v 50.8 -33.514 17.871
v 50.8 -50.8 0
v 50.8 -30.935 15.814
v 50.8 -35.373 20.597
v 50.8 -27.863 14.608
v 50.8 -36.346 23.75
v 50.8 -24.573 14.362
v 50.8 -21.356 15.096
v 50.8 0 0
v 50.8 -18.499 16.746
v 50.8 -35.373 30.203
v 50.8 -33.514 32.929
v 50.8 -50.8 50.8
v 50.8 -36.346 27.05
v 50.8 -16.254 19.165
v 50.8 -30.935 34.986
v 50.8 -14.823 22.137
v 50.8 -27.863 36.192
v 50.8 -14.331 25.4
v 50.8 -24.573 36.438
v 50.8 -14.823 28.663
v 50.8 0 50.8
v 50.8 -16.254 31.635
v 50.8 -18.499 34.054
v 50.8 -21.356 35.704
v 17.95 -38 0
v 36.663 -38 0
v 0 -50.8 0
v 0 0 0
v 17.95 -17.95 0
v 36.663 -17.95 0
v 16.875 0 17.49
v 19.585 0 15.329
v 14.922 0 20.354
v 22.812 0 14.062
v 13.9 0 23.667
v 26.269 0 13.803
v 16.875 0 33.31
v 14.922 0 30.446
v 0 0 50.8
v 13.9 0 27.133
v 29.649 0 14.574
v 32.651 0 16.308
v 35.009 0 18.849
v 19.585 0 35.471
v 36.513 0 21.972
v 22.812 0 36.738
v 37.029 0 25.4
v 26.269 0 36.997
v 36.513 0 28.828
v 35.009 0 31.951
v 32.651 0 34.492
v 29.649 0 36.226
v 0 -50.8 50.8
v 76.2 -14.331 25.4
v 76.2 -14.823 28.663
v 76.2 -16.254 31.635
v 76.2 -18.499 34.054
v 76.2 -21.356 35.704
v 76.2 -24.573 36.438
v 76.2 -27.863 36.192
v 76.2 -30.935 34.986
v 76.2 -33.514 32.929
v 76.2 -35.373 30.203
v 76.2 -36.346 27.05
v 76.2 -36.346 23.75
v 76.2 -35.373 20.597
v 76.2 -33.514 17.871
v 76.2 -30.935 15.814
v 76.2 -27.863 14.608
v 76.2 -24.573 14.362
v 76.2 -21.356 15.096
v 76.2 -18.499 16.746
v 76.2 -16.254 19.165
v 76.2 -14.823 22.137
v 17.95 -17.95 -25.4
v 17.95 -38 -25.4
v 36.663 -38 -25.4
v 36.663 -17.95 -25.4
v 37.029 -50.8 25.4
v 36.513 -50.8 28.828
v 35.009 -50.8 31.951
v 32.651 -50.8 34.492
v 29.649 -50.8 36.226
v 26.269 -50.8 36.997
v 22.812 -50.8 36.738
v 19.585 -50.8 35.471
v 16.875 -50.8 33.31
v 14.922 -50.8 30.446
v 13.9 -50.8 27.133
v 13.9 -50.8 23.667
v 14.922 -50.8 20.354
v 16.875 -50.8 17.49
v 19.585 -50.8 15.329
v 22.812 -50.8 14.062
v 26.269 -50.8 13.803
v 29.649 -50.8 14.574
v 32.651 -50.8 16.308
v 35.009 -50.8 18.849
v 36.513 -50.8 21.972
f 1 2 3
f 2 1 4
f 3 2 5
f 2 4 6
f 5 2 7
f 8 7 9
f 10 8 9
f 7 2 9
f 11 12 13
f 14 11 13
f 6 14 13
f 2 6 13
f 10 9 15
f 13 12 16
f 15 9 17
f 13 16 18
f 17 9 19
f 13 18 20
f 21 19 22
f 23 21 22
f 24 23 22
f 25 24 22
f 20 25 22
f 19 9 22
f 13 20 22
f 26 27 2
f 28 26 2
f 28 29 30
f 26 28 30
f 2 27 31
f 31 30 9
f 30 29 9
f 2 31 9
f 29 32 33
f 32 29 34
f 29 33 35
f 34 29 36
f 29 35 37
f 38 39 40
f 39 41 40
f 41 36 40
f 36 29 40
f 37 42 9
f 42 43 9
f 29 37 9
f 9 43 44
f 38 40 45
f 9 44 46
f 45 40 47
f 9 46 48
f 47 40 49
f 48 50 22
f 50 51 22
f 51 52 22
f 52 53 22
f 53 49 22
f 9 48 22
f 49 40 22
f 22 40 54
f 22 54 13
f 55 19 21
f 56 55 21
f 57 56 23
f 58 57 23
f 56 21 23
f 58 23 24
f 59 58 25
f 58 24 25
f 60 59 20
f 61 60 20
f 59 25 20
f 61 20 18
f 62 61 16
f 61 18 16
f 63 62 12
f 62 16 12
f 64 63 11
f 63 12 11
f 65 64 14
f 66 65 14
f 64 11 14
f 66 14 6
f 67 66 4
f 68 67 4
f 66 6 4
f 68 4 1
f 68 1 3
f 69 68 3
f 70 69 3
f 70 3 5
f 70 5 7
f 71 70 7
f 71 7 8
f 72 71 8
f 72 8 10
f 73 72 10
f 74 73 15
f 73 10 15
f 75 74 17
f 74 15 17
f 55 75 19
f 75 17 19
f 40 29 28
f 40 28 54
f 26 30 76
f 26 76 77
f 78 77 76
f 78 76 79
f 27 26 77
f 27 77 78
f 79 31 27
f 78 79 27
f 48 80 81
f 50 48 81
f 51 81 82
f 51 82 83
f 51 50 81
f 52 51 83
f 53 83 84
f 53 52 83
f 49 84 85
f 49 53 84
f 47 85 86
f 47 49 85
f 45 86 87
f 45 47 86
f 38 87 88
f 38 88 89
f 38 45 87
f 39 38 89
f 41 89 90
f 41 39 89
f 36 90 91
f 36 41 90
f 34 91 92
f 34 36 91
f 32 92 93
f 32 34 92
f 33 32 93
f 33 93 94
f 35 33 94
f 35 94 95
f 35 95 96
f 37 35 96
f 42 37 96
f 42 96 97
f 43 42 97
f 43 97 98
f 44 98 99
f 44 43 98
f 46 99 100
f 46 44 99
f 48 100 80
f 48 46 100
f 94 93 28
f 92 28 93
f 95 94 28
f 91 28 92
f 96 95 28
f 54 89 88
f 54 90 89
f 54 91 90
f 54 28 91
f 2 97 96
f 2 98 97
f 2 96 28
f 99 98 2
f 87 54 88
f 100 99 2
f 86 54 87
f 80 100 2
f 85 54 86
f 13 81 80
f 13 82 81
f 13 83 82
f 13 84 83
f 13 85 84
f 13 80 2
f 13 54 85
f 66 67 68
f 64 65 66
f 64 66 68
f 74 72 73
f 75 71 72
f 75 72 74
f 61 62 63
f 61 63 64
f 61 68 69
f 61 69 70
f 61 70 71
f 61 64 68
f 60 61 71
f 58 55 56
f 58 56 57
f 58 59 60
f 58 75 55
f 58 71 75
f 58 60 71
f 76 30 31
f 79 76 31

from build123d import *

# Parameters (mm, degrees)
F0_W     = 50.8
F0_H     = 50.8
F0_R     = 11.629438
F1_DEPTH = 50.8
F2_W     = 18.713556
F2_H     = 20.050238
F3_DEPTH = 25.4
F4_R     = 11.069142
F5_DEPTH = 25.4


with BuildPart() as f1:
    # F0 (on Front) → F1 (new body)
    with BuildSketch(Plane.XZ):
        with Locations((25.4, 25.4)):
            Rectangle(F0_W, F0_H)
        with Locations((25.4, 25.4)):
            Circle(F0_R, mode=Mode.SUBTRACT)
    extrude(amount=F1_DEPTH)

    # F2 (on face) → F3 (join)
    with BuildSketch(Plane(origin=(0, 0, 0), x_dir=(1, 0, 0), z_dir=(0, 0, -1))):
        with Locations((27.306516, 27.974857)):
            Rectangle(F2_W, F2_H)
    extrude(amount=F3_DEPTH)

    # F4 (on face) → F5 (join)
    with BuildSketch(Plane.YZ.offset(50.8)):
        with Locations((-25.4, 25.4)):
            Circle(F4_R)
    extrude(amount=F5_DEPTH)


solid = f1.part
